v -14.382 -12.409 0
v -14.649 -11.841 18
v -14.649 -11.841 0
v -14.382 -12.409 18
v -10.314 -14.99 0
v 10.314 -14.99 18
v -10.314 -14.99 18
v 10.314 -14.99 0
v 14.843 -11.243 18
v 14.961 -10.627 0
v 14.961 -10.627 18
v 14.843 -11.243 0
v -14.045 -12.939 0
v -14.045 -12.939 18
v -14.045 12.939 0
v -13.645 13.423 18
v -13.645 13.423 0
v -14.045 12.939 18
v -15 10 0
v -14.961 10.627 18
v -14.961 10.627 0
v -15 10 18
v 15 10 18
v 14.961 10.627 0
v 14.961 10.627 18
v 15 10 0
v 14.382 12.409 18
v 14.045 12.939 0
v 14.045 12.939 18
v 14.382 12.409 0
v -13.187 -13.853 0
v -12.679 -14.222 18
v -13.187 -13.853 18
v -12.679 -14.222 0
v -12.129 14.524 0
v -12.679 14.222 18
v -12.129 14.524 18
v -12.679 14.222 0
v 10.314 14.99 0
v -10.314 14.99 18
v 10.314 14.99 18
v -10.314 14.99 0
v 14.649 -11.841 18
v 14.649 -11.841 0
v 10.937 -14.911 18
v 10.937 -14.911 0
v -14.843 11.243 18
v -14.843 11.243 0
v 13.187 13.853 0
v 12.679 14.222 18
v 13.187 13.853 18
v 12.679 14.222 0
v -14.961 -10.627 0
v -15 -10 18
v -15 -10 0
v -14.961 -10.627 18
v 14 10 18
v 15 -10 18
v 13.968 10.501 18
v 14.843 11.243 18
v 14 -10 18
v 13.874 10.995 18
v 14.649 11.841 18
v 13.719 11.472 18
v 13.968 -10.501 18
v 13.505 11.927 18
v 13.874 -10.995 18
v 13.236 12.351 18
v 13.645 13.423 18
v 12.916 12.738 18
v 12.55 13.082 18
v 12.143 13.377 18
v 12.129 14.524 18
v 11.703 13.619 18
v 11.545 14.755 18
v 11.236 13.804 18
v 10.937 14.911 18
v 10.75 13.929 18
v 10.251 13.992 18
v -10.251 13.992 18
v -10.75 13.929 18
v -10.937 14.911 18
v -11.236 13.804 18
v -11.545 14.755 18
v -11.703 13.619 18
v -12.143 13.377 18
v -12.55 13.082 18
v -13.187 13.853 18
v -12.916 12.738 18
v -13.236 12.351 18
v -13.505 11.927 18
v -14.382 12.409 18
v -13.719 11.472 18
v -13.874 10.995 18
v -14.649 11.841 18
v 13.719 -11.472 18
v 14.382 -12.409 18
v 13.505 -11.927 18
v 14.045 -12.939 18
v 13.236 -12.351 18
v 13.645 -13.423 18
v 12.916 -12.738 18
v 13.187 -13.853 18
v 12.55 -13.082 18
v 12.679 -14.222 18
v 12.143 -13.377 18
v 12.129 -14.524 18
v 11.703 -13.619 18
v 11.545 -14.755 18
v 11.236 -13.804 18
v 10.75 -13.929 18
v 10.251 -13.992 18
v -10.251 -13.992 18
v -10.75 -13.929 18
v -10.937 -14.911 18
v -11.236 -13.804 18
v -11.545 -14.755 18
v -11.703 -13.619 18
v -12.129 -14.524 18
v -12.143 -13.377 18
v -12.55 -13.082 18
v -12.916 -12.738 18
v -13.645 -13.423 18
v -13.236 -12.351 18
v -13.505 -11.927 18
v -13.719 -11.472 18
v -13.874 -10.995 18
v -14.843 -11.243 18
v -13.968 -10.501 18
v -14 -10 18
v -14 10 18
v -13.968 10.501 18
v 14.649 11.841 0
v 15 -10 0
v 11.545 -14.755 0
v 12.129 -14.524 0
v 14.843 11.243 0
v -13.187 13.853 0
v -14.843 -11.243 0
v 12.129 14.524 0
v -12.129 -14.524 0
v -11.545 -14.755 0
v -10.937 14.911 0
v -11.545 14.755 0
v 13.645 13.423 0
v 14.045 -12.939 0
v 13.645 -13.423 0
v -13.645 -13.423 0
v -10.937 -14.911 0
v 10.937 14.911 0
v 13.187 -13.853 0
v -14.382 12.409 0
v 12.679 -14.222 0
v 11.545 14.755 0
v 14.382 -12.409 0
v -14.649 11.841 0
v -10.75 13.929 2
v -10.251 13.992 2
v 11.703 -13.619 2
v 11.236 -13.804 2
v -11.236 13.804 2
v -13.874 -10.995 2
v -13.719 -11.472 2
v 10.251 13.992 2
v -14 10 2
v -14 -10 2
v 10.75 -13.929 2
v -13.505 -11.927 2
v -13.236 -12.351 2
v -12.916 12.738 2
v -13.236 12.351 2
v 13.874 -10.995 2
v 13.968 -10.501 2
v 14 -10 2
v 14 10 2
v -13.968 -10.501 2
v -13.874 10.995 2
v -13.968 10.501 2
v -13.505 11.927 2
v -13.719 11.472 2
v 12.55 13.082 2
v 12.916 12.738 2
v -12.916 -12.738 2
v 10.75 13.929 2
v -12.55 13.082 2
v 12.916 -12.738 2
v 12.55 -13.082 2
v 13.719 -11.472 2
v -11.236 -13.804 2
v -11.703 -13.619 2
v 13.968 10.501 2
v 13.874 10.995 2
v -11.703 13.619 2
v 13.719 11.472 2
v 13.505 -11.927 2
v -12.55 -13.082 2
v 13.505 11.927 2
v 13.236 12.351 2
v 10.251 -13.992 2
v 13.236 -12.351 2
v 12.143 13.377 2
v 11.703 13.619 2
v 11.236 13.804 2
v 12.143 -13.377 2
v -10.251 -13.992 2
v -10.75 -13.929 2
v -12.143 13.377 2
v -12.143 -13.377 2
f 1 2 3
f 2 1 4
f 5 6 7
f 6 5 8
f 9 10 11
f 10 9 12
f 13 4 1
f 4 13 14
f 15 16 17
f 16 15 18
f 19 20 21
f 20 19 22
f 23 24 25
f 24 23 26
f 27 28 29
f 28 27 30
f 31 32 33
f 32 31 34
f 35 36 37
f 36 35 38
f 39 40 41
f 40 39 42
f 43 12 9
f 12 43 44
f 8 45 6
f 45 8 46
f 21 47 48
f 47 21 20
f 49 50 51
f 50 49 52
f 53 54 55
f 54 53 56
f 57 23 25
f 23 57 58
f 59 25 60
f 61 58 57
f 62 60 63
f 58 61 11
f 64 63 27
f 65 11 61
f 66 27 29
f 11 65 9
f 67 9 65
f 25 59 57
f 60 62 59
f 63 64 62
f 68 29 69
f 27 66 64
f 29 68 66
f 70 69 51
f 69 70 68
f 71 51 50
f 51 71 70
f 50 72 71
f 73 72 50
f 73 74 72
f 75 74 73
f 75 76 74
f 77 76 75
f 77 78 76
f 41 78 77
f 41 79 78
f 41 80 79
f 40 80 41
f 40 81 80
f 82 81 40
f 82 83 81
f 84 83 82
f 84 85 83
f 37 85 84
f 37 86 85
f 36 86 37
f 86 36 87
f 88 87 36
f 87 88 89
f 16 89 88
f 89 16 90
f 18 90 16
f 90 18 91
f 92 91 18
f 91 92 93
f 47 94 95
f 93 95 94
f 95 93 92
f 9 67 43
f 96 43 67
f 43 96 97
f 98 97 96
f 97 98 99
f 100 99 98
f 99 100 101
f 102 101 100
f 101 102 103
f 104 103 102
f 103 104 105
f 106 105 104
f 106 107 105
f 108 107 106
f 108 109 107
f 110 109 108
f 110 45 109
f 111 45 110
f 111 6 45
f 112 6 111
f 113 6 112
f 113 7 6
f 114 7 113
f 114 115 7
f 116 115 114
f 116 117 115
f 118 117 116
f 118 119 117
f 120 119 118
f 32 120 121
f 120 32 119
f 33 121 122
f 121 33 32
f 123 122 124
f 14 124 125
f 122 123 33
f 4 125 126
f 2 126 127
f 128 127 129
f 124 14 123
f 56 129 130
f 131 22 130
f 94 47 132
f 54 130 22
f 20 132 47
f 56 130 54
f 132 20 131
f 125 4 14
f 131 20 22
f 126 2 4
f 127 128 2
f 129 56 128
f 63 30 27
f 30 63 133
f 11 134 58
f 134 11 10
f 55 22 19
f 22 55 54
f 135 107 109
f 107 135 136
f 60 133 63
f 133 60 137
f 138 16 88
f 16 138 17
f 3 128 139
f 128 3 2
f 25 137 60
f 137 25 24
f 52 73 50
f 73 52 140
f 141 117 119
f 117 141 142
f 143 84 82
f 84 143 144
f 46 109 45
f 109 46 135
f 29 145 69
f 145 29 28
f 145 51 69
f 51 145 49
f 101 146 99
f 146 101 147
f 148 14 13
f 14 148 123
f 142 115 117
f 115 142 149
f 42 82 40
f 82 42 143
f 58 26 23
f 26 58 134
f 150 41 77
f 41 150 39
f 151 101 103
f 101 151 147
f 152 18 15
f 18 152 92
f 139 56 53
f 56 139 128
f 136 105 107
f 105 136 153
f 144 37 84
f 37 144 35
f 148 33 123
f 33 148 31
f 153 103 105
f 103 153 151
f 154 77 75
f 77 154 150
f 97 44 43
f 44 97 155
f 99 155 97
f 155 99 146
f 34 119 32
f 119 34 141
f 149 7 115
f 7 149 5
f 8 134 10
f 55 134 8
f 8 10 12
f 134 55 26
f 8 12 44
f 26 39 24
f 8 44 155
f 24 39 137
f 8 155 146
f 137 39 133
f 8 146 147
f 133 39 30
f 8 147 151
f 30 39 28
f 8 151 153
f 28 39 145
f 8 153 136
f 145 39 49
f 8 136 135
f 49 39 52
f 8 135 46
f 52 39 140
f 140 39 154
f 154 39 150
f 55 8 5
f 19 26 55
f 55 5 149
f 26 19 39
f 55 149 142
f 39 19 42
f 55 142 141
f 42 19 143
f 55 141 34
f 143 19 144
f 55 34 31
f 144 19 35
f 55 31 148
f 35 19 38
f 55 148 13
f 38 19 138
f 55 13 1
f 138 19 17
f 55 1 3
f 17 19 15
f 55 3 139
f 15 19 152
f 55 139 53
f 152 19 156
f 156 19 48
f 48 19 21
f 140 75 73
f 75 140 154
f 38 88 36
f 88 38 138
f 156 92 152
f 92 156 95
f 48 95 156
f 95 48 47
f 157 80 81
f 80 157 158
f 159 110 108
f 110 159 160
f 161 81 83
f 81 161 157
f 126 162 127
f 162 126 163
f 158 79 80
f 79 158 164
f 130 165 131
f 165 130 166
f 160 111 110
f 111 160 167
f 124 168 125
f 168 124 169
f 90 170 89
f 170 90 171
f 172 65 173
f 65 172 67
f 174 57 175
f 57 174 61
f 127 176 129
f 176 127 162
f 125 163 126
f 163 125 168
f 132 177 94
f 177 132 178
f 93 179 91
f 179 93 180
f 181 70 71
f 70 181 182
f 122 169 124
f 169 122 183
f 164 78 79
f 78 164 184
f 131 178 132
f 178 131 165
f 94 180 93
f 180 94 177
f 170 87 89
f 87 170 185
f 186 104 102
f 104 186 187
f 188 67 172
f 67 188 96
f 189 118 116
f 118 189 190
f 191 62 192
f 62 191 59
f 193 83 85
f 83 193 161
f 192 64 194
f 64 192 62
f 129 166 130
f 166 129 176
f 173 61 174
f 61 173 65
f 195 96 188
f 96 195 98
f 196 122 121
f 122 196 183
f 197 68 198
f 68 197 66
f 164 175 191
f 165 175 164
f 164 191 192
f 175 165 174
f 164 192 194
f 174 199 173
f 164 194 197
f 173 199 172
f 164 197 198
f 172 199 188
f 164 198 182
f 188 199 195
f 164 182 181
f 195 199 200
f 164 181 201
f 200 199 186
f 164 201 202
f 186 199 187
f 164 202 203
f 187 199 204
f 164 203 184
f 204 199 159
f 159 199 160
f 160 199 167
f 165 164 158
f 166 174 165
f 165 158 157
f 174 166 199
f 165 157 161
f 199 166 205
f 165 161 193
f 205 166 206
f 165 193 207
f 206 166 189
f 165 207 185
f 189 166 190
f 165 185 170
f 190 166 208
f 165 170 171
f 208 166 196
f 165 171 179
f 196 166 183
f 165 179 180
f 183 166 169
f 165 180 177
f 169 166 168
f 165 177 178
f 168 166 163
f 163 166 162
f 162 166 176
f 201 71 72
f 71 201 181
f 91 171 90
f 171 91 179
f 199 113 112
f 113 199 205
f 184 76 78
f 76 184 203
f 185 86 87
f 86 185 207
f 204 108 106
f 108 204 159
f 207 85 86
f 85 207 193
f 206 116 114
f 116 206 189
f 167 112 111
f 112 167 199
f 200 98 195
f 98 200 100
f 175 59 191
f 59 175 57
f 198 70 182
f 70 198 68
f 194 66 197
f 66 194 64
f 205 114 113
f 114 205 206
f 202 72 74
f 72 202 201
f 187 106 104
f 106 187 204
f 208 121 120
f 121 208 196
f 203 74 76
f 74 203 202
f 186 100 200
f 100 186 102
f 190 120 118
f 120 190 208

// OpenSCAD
$fn = 50;


difference() {
	union() {
		hull() {
			translate(v = [-10.0000000000, 10.0000000000, 0]) {
				cylinder(h = 18, r = 5);
			}
			translate(v = [10.0000000000, 10.0000000000, 0]) {
				cylinder(h = 18, r = 5);
			}
			translate(v = [-10.0000000000, -10.0000000000, 0]) {
				cylinder(h = 18, r = 5);
			}
			translate(v = [10.0000000000, -10.0000000000, 0]) {
				cylinder(h = 18, r = 5);
			}
		}
	}
	union() {
		translate(v = [0, 0, 2]) {
			hull() {
				translate(v = [-10.0000000000, 10.0000000000, 0]) {
					cylinder(h = 16, r = 4);
				}
				translate(v = [10.0000000000, 10.0000000000, 0]) {
					cylinder(h = 16, r = 4);
				}
				translate(v = [-10.0000000000, -10.0000000000, 0]) {
					cylinder(h = 16, r = 4);
				}
				translate(v = [10.0000000000, -10.0000000000, 0]) {
					cylinder(h = 16, r = 4);
				}
			}
		}
	}
}
